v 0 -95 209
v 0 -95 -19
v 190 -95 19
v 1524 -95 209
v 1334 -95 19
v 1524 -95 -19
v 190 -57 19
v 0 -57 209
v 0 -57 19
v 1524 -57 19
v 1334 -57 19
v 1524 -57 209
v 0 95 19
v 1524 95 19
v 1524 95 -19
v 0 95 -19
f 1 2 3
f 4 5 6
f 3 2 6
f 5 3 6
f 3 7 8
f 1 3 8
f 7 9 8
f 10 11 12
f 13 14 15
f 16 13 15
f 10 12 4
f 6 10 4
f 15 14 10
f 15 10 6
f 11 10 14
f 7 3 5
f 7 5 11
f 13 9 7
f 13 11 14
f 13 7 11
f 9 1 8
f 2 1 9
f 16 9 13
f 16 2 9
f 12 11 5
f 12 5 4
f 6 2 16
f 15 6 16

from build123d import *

# Parameters (mm, degrees)
SKETCH1_W           = 38
SKETCH1_H           = 190
BOSS_EXTRUDE1_DEPTH = 1524
SKETCH2_W           = 190
SKETCH2_H           = 38
BOSS_EXTRUDE2_DEPTH = 190
CUT_EXTRUDE1_DEPTH  = 190


with BuildPart() as part:
    # Sketch1 → Boss-Extrude1 (new body)
    with BuildSketch(Plane(origin=(0, 0, 0), x_dir=(0, 0, -1), z_dir=(1, 0, 0))):
        Rectangle(SKETCH1_W, SKETCH1_H)
    extrude(amount=BOSS_EXTRUDE1_DEPTH)

    # Sketch2 → Boss-Extrude2 (add)
    with BuildSketch(Plane.XY.offset(19)):
        with Locations((95, -76)):
            Rectangle(SKETCH2_W, SKETCH2_H)
        with Locations((1429, -76)):
            Rectangle(SKETCH2_W, SKETCH2_H)
    extrude(amount=BOSS_EXTRUDE2_DEPTH)

    # Sketch3 → Cut-Extrude1 (cut)
    with BuildSketch(Plane(origin=(0, -57, 0), x_dir=(1, 0, 0), z_dir=(0, 1, 0))):
        Polygon((190, -19), (0, -209), (190, -209), align=None)
        Polygon((1334, -19), (1524, -209), (1334, -209), align=None)
    extrude(amount=-CUT_EXTRUDE1_DEPTH, mode=Mode.SUBTRACT)


solid = part.part
